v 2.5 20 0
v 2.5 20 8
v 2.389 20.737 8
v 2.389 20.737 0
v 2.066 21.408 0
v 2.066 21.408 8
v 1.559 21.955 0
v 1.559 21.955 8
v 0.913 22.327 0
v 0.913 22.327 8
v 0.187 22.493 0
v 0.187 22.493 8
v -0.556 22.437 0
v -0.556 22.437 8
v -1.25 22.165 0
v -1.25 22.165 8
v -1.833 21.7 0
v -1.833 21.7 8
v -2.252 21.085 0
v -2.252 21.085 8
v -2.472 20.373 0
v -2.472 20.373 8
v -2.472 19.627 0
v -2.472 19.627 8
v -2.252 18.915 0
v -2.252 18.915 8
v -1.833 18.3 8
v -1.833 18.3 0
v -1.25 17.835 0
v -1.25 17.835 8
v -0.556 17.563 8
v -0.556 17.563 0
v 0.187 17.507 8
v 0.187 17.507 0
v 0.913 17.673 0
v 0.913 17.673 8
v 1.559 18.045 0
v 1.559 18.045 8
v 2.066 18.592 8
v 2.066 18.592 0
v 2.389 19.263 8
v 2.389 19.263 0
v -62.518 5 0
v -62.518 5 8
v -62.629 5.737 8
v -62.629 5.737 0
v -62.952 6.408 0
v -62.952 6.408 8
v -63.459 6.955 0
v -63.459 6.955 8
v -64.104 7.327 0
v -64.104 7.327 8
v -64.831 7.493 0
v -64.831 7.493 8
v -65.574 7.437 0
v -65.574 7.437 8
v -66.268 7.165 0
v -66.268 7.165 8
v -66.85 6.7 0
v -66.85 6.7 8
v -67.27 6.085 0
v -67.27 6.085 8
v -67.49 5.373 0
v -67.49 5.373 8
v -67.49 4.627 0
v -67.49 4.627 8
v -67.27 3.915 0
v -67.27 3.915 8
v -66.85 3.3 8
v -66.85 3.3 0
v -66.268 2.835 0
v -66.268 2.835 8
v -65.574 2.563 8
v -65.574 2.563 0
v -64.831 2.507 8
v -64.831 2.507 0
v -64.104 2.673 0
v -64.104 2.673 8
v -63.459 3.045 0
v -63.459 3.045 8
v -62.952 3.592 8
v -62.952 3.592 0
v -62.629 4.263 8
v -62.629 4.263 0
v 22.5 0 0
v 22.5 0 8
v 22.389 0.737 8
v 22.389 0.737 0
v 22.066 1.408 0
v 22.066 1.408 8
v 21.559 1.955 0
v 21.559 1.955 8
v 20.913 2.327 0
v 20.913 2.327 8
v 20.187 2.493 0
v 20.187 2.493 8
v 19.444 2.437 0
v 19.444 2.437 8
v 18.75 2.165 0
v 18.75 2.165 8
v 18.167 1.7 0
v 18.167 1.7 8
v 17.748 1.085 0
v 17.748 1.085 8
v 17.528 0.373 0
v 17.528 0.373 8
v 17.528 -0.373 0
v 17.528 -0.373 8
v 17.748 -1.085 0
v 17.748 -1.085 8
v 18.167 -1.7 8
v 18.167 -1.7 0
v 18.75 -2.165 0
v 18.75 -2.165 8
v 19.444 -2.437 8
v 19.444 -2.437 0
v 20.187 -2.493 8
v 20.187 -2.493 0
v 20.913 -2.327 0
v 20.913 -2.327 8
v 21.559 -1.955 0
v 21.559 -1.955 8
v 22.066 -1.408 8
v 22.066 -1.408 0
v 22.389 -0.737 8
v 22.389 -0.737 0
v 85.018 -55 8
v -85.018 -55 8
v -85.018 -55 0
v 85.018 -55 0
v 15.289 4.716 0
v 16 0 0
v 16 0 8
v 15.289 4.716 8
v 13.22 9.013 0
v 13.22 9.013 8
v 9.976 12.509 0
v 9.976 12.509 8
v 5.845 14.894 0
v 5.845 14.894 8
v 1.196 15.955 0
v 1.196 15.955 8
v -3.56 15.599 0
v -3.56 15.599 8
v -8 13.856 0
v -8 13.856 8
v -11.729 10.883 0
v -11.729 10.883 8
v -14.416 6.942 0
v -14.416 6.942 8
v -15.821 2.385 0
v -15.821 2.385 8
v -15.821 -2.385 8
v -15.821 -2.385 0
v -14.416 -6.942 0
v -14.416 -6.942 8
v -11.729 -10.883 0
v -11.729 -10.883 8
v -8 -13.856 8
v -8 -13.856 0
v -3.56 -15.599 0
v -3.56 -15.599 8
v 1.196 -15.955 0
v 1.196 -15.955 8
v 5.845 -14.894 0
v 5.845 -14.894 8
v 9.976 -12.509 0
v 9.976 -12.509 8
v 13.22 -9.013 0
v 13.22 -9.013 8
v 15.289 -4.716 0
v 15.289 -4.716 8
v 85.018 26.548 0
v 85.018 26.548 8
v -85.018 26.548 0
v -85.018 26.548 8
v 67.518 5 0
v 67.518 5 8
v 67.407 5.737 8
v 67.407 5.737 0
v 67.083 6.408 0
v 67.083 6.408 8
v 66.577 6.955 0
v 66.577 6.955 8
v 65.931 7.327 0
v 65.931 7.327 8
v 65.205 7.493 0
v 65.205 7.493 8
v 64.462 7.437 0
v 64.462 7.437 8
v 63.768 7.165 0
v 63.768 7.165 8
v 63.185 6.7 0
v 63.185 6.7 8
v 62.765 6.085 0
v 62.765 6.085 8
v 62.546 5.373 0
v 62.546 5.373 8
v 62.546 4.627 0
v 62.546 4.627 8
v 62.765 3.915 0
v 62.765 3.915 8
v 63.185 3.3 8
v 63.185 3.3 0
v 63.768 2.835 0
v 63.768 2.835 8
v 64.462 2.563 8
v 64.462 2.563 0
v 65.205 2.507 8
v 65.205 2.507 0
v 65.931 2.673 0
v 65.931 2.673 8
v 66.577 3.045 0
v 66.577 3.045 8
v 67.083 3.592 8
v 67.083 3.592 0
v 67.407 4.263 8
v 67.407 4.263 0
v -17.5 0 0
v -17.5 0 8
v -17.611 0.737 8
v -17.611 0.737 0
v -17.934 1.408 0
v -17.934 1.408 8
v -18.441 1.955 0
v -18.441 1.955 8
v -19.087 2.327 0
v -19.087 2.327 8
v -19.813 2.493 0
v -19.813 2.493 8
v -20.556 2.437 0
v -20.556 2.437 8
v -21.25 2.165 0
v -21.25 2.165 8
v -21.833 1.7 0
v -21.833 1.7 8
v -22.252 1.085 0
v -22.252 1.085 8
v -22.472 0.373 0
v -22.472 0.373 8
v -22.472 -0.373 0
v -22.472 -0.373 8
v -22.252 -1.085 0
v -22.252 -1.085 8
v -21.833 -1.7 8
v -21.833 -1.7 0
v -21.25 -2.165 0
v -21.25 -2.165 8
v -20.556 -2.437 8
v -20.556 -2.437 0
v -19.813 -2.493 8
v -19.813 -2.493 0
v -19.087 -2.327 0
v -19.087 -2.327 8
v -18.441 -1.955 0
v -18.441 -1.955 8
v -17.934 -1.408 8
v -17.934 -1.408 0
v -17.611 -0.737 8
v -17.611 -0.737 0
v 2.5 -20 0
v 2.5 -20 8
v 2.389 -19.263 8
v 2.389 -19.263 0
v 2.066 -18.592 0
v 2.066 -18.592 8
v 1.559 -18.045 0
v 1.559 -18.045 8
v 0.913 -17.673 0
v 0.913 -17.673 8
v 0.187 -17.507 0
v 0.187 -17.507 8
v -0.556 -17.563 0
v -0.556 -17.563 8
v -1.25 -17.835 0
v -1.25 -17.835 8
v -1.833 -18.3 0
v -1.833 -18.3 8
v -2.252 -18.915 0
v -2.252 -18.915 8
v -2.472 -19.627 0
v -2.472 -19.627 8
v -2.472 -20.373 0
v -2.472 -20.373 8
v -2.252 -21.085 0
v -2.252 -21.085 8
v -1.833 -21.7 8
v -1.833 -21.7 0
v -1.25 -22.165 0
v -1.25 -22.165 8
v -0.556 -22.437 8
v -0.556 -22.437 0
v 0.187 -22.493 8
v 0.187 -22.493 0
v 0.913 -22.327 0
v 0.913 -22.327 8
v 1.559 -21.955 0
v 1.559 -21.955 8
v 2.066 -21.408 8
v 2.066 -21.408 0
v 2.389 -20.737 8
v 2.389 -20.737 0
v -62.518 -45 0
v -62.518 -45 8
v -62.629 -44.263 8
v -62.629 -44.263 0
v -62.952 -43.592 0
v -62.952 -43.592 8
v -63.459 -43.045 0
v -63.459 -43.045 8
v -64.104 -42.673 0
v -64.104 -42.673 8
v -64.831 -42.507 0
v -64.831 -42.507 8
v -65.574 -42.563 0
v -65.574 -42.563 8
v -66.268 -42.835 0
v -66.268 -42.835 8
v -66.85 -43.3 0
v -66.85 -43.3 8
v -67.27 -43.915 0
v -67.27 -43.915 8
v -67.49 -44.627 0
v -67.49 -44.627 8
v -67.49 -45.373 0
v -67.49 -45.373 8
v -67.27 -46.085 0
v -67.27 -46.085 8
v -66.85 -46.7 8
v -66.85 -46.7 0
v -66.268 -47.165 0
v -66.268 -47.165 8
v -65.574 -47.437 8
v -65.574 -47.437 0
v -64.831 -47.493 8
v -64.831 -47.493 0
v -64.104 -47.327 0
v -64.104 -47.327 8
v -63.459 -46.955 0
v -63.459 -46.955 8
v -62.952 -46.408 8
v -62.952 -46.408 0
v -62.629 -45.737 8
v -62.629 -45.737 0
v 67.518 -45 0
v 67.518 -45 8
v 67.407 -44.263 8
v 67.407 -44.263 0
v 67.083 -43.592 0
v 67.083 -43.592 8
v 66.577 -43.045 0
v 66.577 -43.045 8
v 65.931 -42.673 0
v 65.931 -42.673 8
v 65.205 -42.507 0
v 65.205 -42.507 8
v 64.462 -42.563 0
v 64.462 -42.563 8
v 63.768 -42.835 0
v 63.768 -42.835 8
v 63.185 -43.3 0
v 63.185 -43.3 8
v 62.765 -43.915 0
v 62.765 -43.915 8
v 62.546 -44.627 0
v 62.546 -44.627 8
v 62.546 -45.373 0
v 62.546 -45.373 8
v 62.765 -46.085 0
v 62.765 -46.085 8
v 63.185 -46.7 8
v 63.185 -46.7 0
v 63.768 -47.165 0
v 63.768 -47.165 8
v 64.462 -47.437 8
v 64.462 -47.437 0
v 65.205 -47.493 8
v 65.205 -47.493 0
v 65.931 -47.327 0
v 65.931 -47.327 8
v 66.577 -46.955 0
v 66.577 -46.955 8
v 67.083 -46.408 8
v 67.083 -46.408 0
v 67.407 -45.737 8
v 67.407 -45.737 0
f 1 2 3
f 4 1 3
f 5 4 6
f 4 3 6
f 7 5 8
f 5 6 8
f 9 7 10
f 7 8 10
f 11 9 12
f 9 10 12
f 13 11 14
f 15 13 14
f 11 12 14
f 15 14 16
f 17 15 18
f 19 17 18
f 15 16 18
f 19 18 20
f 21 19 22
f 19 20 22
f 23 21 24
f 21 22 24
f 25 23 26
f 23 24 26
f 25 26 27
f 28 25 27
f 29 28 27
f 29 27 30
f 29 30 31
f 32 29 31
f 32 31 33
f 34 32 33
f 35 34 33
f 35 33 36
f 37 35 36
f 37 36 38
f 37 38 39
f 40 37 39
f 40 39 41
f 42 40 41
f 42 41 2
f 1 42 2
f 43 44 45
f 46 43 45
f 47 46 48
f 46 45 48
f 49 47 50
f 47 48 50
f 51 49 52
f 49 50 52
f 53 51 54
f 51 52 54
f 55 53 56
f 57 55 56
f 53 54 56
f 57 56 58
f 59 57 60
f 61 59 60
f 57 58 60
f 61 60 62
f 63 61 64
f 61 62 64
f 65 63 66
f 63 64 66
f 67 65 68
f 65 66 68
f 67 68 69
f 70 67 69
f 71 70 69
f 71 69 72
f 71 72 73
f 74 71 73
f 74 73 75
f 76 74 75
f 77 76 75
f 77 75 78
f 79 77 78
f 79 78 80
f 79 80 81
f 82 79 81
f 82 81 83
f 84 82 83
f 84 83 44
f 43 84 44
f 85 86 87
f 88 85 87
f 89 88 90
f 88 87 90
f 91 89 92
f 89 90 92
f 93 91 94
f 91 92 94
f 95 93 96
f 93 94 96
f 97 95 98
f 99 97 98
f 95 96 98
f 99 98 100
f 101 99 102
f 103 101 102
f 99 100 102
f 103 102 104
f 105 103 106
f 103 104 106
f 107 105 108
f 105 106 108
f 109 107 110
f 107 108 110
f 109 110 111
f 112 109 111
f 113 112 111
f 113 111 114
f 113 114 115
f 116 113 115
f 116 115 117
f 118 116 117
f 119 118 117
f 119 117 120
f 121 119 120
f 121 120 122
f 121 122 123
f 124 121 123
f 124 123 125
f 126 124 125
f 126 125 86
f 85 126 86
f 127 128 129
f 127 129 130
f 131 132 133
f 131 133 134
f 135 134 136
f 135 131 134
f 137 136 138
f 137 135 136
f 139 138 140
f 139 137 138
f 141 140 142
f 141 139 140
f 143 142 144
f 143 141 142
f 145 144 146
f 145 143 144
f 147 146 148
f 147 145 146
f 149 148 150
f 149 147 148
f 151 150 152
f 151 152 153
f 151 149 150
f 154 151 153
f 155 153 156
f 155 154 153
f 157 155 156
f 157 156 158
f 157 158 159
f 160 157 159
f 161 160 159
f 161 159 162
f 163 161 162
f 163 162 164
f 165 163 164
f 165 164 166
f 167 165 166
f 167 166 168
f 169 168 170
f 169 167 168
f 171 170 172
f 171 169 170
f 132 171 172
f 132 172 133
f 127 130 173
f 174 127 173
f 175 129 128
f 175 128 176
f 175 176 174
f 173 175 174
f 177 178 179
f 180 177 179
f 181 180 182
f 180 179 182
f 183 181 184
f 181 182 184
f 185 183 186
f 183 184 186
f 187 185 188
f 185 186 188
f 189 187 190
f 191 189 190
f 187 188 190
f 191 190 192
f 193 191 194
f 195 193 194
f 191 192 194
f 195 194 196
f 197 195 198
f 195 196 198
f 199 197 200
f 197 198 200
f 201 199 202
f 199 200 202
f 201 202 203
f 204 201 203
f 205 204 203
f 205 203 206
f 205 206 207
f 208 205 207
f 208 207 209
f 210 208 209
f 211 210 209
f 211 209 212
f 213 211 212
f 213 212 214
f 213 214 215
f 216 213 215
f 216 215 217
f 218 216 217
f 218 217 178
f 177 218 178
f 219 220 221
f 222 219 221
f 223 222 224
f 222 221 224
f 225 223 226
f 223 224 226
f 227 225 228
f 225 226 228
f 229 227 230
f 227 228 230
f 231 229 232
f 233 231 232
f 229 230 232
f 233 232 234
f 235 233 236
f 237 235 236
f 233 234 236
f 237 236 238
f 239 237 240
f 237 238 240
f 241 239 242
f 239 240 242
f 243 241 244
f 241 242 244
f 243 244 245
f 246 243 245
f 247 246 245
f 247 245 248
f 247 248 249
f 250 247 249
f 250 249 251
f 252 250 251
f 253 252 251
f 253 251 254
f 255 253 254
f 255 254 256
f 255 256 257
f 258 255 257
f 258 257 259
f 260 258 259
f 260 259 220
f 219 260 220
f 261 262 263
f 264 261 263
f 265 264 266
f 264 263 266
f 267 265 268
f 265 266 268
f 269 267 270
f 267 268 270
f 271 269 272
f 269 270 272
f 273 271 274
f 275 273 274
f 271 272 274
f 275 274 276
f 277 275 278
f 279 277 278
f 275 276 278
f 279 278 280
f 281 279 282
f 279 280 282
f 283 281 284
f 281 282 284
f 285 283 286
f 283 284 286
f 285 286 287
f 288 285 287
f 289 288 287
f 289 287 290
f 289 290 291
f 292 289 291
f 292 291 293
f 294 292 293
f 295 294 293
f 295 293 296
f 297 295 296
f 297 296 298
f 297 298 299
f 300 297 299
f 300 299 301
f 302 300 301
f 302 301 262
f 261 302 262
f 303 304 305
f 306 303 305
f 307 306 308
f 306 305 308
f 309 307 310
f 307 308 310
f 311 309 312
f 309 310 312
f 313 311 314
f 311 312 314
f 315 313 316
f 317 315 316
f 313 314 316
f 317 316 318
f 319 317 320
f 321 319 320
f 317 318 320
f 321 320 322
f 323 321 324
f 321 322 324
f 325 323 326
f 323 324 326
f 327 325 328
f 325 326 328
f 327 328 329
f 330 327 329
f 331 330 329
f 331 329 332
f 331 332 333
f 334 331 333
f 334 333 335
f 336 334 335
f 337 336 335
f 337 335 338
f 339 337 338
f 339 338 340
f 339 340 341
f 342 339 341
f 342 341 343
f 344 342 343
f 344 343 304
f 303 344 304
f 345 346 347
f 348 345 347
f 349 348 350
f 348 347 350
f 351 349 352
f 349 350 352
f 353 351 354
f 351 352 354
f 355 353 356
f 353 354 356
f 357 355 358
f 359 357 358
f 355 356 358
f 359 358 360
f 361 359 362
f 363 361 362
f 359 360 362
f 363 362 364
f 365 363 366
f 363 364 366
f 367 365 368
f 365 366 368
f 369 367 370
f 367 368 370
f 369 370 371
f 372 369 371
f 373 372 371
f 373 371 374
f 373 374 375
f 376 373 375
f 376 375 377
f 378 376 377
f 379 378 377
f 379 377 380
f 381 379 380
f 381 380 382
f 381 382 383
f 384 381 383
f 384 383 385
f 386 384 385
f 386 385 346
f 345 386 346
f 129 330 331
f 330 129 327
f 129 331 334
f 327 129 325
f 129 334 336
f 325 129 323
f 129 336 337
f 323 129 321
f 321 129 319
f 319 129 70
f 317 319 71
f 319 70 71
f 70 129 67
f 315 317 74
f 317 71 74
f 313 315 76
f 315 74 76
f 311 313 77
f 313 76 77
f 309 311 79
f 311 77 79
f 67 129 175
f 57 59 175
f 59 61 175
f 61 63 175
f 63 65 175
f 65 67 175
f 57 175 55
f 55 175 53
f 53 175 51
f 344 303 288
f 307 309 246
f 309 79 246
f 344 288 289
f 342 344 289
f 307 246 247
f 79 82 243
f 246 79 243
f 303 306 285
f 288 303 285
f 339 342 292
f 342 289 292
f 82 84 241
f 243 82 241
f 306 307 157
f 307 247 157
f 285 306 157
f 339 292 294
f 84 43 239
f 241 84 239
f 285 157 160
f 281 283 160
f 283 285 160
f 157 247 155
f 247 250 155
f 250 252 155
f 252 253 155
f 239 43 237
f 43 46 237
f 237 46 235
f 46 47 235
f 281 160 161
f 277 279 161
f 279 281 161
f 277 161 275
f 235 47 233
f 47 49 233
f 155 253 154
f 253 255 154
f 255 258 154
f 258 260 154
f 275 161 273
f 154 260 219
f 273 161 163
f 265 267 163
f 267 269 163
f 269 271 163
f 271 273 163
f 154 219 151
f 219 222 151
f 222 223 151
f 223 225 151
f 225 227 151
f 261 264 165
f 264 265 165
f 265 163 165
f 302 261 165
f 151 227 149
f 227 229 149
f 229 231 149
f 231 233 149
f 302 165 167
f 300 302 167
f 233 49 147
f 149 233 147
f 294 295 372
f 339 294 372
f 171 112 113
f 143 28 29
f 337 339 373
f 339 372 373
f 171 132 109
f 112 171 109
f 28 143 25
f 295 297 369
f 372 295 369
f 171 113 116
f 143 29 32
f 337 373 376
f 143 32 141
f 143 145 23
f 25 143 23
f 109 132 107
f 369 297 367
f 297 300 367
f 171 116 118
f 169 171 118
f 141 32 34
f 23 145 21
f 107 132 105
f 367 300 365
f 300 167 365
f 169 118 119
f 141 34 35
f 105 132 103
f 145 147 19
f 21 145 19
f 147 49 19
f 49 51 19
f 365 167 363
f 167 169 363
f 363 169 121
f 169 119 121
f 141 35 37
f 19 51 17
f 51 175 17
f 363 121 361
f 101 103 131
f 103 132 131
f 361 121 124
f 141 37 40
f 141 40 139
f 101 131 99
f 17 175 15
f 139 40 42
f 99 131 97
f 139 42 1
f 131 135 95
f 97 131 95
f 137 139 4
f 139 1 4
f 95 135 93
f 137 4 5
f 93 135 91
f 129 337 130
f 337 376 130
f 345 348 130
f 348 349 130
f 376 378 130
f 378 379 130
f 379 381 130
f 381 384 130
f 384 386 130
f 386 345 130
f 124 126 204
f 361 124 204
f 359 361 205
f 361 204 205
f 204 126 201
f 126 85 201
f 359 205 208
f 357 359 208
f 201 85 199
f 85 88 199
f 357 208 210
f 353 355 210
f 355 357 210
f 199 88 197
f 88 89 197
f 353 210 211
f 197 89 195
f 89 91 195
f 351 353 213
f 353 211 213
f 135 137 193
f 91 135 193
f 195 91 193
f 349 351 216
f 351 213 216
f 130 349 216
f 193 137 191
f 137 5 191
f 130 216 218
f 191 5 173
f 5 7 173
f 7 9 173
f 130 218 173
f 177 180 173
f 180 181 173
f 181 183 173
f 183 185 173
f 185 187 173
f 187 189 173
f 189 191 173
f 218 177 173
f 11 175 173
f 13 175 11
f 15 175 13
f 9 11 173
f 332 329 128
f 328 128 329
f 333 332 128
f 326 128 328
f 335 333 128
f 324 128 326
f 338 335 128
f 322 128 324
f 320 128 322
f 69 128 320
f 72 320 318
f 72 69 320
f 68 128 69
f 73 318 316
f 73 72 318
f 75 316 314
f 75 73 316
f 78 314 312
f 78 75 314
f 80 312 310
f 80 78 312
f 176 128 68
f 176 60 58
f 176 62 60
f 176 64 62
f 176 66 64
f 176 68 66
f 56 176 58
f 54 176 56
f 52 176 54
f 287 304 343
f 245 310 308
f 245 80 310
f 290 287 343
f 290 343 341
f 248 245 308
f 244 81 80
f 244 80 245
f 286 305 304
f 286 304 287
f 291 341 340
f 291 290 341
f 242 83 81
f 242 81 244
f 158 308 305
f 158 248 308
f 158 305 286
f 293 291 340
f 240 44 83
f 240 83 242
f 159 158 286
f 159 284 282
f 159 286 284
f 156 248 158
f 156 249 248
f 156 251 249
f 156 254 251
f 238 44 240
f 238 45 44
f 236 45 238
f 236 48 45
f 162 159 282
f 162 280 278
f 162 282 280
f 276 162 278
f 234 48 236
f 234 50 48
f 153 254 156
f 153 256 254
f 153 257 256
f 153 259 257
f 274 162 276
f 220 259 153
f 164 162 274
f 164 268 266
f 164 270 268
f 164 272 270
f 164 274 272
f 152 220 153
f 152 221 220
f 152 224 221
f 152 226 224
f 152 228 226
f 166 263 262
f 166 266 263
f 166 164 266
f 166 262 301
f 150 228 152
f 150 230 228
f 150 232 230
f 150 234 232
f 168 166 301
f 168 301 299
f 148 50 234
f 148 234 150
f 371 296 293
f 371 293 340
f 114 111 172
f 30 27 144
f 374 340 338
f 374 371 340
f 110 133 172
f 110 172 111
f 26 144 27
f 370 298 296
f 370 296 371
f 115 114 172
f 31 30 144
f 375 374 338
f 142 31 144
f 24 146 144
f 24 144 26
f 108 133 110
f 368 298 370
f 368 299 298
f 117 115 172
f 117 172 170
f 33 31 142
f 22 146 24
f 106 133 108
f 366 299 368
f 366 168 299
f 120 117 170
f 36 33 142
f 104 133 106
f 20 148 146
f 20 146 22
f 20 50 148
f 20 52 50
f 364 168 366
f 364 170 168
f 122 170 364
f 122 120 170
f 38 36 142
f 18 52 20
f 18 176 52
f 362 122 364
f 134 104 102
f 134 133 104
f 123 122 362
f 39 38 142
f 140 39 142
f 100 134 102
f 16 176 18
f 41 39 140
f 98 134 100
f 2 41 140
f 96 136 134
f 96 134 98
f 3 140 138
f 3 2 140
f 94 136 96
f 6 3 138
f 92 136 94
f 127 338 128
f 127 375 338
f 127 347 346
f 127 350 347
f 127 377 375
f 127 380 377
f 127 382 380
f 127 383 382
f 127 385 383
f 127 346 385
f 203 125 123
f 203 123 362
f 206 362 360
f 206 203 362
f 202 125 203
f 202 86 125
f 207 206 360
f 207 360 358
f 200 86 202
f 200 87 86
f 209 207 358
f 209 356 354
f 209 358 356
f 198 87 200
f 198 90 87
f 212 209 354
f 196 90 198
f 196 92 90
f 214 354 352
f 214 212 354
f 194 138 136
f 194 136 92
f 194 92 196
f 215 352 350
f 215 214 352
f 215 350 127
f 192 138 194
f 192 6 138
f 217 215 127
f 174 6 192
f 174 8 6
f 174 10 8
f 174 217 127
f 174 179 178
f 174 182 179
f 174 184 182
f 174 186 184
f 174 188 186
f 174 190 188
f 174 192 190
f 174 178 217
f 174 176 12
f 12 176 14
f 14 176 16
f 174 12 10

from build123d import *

# Parameters (mm, degrees)
SKETCH1_W           = 170.035665534
SKETCH1_H           = 166.614386528
SKETCH1_R           = 16
BOSS_EXTRUDE1_DEPTH = 8
SKETCH2_R           = 2.5
SKETCH2_W           = 170.035665534
SKETCH2_H           = 56.759468899
SKETCH2_H_2         = 28.307193264
CUT_EXTRUDE1_DEPTH  = 120.298450693


with BuildPart() as part:
    # Sketch1 → Boss-Extrude1 (new body)
    with BuildSketch(Plane.XY):
        Rectangle(SKETCH1_W, SKETCH1_H)
        Circle(SKETCH1_R, mode=Mode.SUBTRACT)
    extrude(amount=BOSS_EXTRUDE1_DEPTH)

    # Sketch2 → Cut-Extrude1 (cut, through all)
    with BuildSketch(Plane.XY.offset(8)):
        with Locations((-65.017832767, 5)):
            Circle(SKETCH2_R)
        with Locations((-65.017832767, -45)):
            Circle(SKETCH2_R)
        with Locations((65.017832767, 5)):
            Circle(SKETCH2_R)
        with Locations((65.017832767, -45)):
            Circle(SKETCH2_R)
        with Locations((0, 20)):
            Circle(SKETCH2_R)
        with Locations((-20, 0)):
            Circle(SKETCH2_R)
        with Locations((0, -20)):
            Circle(SKETCH2_R)
        with Locations((20, 0)):
            Circle(SKETCH2_R)
        with Locations((0, 54.927458814)):
            Rectangle(SKETCH2_W, SKETCH2_H)
        with Locations((0, -69.153596632)):
            Rectangle(SKETCH2_W, SKETCH2_H_2)
    extrude(amount=-CUT_EXTRUDE1_DEPTH, mode=Mode.SUBTRACT)


solid = part.part
